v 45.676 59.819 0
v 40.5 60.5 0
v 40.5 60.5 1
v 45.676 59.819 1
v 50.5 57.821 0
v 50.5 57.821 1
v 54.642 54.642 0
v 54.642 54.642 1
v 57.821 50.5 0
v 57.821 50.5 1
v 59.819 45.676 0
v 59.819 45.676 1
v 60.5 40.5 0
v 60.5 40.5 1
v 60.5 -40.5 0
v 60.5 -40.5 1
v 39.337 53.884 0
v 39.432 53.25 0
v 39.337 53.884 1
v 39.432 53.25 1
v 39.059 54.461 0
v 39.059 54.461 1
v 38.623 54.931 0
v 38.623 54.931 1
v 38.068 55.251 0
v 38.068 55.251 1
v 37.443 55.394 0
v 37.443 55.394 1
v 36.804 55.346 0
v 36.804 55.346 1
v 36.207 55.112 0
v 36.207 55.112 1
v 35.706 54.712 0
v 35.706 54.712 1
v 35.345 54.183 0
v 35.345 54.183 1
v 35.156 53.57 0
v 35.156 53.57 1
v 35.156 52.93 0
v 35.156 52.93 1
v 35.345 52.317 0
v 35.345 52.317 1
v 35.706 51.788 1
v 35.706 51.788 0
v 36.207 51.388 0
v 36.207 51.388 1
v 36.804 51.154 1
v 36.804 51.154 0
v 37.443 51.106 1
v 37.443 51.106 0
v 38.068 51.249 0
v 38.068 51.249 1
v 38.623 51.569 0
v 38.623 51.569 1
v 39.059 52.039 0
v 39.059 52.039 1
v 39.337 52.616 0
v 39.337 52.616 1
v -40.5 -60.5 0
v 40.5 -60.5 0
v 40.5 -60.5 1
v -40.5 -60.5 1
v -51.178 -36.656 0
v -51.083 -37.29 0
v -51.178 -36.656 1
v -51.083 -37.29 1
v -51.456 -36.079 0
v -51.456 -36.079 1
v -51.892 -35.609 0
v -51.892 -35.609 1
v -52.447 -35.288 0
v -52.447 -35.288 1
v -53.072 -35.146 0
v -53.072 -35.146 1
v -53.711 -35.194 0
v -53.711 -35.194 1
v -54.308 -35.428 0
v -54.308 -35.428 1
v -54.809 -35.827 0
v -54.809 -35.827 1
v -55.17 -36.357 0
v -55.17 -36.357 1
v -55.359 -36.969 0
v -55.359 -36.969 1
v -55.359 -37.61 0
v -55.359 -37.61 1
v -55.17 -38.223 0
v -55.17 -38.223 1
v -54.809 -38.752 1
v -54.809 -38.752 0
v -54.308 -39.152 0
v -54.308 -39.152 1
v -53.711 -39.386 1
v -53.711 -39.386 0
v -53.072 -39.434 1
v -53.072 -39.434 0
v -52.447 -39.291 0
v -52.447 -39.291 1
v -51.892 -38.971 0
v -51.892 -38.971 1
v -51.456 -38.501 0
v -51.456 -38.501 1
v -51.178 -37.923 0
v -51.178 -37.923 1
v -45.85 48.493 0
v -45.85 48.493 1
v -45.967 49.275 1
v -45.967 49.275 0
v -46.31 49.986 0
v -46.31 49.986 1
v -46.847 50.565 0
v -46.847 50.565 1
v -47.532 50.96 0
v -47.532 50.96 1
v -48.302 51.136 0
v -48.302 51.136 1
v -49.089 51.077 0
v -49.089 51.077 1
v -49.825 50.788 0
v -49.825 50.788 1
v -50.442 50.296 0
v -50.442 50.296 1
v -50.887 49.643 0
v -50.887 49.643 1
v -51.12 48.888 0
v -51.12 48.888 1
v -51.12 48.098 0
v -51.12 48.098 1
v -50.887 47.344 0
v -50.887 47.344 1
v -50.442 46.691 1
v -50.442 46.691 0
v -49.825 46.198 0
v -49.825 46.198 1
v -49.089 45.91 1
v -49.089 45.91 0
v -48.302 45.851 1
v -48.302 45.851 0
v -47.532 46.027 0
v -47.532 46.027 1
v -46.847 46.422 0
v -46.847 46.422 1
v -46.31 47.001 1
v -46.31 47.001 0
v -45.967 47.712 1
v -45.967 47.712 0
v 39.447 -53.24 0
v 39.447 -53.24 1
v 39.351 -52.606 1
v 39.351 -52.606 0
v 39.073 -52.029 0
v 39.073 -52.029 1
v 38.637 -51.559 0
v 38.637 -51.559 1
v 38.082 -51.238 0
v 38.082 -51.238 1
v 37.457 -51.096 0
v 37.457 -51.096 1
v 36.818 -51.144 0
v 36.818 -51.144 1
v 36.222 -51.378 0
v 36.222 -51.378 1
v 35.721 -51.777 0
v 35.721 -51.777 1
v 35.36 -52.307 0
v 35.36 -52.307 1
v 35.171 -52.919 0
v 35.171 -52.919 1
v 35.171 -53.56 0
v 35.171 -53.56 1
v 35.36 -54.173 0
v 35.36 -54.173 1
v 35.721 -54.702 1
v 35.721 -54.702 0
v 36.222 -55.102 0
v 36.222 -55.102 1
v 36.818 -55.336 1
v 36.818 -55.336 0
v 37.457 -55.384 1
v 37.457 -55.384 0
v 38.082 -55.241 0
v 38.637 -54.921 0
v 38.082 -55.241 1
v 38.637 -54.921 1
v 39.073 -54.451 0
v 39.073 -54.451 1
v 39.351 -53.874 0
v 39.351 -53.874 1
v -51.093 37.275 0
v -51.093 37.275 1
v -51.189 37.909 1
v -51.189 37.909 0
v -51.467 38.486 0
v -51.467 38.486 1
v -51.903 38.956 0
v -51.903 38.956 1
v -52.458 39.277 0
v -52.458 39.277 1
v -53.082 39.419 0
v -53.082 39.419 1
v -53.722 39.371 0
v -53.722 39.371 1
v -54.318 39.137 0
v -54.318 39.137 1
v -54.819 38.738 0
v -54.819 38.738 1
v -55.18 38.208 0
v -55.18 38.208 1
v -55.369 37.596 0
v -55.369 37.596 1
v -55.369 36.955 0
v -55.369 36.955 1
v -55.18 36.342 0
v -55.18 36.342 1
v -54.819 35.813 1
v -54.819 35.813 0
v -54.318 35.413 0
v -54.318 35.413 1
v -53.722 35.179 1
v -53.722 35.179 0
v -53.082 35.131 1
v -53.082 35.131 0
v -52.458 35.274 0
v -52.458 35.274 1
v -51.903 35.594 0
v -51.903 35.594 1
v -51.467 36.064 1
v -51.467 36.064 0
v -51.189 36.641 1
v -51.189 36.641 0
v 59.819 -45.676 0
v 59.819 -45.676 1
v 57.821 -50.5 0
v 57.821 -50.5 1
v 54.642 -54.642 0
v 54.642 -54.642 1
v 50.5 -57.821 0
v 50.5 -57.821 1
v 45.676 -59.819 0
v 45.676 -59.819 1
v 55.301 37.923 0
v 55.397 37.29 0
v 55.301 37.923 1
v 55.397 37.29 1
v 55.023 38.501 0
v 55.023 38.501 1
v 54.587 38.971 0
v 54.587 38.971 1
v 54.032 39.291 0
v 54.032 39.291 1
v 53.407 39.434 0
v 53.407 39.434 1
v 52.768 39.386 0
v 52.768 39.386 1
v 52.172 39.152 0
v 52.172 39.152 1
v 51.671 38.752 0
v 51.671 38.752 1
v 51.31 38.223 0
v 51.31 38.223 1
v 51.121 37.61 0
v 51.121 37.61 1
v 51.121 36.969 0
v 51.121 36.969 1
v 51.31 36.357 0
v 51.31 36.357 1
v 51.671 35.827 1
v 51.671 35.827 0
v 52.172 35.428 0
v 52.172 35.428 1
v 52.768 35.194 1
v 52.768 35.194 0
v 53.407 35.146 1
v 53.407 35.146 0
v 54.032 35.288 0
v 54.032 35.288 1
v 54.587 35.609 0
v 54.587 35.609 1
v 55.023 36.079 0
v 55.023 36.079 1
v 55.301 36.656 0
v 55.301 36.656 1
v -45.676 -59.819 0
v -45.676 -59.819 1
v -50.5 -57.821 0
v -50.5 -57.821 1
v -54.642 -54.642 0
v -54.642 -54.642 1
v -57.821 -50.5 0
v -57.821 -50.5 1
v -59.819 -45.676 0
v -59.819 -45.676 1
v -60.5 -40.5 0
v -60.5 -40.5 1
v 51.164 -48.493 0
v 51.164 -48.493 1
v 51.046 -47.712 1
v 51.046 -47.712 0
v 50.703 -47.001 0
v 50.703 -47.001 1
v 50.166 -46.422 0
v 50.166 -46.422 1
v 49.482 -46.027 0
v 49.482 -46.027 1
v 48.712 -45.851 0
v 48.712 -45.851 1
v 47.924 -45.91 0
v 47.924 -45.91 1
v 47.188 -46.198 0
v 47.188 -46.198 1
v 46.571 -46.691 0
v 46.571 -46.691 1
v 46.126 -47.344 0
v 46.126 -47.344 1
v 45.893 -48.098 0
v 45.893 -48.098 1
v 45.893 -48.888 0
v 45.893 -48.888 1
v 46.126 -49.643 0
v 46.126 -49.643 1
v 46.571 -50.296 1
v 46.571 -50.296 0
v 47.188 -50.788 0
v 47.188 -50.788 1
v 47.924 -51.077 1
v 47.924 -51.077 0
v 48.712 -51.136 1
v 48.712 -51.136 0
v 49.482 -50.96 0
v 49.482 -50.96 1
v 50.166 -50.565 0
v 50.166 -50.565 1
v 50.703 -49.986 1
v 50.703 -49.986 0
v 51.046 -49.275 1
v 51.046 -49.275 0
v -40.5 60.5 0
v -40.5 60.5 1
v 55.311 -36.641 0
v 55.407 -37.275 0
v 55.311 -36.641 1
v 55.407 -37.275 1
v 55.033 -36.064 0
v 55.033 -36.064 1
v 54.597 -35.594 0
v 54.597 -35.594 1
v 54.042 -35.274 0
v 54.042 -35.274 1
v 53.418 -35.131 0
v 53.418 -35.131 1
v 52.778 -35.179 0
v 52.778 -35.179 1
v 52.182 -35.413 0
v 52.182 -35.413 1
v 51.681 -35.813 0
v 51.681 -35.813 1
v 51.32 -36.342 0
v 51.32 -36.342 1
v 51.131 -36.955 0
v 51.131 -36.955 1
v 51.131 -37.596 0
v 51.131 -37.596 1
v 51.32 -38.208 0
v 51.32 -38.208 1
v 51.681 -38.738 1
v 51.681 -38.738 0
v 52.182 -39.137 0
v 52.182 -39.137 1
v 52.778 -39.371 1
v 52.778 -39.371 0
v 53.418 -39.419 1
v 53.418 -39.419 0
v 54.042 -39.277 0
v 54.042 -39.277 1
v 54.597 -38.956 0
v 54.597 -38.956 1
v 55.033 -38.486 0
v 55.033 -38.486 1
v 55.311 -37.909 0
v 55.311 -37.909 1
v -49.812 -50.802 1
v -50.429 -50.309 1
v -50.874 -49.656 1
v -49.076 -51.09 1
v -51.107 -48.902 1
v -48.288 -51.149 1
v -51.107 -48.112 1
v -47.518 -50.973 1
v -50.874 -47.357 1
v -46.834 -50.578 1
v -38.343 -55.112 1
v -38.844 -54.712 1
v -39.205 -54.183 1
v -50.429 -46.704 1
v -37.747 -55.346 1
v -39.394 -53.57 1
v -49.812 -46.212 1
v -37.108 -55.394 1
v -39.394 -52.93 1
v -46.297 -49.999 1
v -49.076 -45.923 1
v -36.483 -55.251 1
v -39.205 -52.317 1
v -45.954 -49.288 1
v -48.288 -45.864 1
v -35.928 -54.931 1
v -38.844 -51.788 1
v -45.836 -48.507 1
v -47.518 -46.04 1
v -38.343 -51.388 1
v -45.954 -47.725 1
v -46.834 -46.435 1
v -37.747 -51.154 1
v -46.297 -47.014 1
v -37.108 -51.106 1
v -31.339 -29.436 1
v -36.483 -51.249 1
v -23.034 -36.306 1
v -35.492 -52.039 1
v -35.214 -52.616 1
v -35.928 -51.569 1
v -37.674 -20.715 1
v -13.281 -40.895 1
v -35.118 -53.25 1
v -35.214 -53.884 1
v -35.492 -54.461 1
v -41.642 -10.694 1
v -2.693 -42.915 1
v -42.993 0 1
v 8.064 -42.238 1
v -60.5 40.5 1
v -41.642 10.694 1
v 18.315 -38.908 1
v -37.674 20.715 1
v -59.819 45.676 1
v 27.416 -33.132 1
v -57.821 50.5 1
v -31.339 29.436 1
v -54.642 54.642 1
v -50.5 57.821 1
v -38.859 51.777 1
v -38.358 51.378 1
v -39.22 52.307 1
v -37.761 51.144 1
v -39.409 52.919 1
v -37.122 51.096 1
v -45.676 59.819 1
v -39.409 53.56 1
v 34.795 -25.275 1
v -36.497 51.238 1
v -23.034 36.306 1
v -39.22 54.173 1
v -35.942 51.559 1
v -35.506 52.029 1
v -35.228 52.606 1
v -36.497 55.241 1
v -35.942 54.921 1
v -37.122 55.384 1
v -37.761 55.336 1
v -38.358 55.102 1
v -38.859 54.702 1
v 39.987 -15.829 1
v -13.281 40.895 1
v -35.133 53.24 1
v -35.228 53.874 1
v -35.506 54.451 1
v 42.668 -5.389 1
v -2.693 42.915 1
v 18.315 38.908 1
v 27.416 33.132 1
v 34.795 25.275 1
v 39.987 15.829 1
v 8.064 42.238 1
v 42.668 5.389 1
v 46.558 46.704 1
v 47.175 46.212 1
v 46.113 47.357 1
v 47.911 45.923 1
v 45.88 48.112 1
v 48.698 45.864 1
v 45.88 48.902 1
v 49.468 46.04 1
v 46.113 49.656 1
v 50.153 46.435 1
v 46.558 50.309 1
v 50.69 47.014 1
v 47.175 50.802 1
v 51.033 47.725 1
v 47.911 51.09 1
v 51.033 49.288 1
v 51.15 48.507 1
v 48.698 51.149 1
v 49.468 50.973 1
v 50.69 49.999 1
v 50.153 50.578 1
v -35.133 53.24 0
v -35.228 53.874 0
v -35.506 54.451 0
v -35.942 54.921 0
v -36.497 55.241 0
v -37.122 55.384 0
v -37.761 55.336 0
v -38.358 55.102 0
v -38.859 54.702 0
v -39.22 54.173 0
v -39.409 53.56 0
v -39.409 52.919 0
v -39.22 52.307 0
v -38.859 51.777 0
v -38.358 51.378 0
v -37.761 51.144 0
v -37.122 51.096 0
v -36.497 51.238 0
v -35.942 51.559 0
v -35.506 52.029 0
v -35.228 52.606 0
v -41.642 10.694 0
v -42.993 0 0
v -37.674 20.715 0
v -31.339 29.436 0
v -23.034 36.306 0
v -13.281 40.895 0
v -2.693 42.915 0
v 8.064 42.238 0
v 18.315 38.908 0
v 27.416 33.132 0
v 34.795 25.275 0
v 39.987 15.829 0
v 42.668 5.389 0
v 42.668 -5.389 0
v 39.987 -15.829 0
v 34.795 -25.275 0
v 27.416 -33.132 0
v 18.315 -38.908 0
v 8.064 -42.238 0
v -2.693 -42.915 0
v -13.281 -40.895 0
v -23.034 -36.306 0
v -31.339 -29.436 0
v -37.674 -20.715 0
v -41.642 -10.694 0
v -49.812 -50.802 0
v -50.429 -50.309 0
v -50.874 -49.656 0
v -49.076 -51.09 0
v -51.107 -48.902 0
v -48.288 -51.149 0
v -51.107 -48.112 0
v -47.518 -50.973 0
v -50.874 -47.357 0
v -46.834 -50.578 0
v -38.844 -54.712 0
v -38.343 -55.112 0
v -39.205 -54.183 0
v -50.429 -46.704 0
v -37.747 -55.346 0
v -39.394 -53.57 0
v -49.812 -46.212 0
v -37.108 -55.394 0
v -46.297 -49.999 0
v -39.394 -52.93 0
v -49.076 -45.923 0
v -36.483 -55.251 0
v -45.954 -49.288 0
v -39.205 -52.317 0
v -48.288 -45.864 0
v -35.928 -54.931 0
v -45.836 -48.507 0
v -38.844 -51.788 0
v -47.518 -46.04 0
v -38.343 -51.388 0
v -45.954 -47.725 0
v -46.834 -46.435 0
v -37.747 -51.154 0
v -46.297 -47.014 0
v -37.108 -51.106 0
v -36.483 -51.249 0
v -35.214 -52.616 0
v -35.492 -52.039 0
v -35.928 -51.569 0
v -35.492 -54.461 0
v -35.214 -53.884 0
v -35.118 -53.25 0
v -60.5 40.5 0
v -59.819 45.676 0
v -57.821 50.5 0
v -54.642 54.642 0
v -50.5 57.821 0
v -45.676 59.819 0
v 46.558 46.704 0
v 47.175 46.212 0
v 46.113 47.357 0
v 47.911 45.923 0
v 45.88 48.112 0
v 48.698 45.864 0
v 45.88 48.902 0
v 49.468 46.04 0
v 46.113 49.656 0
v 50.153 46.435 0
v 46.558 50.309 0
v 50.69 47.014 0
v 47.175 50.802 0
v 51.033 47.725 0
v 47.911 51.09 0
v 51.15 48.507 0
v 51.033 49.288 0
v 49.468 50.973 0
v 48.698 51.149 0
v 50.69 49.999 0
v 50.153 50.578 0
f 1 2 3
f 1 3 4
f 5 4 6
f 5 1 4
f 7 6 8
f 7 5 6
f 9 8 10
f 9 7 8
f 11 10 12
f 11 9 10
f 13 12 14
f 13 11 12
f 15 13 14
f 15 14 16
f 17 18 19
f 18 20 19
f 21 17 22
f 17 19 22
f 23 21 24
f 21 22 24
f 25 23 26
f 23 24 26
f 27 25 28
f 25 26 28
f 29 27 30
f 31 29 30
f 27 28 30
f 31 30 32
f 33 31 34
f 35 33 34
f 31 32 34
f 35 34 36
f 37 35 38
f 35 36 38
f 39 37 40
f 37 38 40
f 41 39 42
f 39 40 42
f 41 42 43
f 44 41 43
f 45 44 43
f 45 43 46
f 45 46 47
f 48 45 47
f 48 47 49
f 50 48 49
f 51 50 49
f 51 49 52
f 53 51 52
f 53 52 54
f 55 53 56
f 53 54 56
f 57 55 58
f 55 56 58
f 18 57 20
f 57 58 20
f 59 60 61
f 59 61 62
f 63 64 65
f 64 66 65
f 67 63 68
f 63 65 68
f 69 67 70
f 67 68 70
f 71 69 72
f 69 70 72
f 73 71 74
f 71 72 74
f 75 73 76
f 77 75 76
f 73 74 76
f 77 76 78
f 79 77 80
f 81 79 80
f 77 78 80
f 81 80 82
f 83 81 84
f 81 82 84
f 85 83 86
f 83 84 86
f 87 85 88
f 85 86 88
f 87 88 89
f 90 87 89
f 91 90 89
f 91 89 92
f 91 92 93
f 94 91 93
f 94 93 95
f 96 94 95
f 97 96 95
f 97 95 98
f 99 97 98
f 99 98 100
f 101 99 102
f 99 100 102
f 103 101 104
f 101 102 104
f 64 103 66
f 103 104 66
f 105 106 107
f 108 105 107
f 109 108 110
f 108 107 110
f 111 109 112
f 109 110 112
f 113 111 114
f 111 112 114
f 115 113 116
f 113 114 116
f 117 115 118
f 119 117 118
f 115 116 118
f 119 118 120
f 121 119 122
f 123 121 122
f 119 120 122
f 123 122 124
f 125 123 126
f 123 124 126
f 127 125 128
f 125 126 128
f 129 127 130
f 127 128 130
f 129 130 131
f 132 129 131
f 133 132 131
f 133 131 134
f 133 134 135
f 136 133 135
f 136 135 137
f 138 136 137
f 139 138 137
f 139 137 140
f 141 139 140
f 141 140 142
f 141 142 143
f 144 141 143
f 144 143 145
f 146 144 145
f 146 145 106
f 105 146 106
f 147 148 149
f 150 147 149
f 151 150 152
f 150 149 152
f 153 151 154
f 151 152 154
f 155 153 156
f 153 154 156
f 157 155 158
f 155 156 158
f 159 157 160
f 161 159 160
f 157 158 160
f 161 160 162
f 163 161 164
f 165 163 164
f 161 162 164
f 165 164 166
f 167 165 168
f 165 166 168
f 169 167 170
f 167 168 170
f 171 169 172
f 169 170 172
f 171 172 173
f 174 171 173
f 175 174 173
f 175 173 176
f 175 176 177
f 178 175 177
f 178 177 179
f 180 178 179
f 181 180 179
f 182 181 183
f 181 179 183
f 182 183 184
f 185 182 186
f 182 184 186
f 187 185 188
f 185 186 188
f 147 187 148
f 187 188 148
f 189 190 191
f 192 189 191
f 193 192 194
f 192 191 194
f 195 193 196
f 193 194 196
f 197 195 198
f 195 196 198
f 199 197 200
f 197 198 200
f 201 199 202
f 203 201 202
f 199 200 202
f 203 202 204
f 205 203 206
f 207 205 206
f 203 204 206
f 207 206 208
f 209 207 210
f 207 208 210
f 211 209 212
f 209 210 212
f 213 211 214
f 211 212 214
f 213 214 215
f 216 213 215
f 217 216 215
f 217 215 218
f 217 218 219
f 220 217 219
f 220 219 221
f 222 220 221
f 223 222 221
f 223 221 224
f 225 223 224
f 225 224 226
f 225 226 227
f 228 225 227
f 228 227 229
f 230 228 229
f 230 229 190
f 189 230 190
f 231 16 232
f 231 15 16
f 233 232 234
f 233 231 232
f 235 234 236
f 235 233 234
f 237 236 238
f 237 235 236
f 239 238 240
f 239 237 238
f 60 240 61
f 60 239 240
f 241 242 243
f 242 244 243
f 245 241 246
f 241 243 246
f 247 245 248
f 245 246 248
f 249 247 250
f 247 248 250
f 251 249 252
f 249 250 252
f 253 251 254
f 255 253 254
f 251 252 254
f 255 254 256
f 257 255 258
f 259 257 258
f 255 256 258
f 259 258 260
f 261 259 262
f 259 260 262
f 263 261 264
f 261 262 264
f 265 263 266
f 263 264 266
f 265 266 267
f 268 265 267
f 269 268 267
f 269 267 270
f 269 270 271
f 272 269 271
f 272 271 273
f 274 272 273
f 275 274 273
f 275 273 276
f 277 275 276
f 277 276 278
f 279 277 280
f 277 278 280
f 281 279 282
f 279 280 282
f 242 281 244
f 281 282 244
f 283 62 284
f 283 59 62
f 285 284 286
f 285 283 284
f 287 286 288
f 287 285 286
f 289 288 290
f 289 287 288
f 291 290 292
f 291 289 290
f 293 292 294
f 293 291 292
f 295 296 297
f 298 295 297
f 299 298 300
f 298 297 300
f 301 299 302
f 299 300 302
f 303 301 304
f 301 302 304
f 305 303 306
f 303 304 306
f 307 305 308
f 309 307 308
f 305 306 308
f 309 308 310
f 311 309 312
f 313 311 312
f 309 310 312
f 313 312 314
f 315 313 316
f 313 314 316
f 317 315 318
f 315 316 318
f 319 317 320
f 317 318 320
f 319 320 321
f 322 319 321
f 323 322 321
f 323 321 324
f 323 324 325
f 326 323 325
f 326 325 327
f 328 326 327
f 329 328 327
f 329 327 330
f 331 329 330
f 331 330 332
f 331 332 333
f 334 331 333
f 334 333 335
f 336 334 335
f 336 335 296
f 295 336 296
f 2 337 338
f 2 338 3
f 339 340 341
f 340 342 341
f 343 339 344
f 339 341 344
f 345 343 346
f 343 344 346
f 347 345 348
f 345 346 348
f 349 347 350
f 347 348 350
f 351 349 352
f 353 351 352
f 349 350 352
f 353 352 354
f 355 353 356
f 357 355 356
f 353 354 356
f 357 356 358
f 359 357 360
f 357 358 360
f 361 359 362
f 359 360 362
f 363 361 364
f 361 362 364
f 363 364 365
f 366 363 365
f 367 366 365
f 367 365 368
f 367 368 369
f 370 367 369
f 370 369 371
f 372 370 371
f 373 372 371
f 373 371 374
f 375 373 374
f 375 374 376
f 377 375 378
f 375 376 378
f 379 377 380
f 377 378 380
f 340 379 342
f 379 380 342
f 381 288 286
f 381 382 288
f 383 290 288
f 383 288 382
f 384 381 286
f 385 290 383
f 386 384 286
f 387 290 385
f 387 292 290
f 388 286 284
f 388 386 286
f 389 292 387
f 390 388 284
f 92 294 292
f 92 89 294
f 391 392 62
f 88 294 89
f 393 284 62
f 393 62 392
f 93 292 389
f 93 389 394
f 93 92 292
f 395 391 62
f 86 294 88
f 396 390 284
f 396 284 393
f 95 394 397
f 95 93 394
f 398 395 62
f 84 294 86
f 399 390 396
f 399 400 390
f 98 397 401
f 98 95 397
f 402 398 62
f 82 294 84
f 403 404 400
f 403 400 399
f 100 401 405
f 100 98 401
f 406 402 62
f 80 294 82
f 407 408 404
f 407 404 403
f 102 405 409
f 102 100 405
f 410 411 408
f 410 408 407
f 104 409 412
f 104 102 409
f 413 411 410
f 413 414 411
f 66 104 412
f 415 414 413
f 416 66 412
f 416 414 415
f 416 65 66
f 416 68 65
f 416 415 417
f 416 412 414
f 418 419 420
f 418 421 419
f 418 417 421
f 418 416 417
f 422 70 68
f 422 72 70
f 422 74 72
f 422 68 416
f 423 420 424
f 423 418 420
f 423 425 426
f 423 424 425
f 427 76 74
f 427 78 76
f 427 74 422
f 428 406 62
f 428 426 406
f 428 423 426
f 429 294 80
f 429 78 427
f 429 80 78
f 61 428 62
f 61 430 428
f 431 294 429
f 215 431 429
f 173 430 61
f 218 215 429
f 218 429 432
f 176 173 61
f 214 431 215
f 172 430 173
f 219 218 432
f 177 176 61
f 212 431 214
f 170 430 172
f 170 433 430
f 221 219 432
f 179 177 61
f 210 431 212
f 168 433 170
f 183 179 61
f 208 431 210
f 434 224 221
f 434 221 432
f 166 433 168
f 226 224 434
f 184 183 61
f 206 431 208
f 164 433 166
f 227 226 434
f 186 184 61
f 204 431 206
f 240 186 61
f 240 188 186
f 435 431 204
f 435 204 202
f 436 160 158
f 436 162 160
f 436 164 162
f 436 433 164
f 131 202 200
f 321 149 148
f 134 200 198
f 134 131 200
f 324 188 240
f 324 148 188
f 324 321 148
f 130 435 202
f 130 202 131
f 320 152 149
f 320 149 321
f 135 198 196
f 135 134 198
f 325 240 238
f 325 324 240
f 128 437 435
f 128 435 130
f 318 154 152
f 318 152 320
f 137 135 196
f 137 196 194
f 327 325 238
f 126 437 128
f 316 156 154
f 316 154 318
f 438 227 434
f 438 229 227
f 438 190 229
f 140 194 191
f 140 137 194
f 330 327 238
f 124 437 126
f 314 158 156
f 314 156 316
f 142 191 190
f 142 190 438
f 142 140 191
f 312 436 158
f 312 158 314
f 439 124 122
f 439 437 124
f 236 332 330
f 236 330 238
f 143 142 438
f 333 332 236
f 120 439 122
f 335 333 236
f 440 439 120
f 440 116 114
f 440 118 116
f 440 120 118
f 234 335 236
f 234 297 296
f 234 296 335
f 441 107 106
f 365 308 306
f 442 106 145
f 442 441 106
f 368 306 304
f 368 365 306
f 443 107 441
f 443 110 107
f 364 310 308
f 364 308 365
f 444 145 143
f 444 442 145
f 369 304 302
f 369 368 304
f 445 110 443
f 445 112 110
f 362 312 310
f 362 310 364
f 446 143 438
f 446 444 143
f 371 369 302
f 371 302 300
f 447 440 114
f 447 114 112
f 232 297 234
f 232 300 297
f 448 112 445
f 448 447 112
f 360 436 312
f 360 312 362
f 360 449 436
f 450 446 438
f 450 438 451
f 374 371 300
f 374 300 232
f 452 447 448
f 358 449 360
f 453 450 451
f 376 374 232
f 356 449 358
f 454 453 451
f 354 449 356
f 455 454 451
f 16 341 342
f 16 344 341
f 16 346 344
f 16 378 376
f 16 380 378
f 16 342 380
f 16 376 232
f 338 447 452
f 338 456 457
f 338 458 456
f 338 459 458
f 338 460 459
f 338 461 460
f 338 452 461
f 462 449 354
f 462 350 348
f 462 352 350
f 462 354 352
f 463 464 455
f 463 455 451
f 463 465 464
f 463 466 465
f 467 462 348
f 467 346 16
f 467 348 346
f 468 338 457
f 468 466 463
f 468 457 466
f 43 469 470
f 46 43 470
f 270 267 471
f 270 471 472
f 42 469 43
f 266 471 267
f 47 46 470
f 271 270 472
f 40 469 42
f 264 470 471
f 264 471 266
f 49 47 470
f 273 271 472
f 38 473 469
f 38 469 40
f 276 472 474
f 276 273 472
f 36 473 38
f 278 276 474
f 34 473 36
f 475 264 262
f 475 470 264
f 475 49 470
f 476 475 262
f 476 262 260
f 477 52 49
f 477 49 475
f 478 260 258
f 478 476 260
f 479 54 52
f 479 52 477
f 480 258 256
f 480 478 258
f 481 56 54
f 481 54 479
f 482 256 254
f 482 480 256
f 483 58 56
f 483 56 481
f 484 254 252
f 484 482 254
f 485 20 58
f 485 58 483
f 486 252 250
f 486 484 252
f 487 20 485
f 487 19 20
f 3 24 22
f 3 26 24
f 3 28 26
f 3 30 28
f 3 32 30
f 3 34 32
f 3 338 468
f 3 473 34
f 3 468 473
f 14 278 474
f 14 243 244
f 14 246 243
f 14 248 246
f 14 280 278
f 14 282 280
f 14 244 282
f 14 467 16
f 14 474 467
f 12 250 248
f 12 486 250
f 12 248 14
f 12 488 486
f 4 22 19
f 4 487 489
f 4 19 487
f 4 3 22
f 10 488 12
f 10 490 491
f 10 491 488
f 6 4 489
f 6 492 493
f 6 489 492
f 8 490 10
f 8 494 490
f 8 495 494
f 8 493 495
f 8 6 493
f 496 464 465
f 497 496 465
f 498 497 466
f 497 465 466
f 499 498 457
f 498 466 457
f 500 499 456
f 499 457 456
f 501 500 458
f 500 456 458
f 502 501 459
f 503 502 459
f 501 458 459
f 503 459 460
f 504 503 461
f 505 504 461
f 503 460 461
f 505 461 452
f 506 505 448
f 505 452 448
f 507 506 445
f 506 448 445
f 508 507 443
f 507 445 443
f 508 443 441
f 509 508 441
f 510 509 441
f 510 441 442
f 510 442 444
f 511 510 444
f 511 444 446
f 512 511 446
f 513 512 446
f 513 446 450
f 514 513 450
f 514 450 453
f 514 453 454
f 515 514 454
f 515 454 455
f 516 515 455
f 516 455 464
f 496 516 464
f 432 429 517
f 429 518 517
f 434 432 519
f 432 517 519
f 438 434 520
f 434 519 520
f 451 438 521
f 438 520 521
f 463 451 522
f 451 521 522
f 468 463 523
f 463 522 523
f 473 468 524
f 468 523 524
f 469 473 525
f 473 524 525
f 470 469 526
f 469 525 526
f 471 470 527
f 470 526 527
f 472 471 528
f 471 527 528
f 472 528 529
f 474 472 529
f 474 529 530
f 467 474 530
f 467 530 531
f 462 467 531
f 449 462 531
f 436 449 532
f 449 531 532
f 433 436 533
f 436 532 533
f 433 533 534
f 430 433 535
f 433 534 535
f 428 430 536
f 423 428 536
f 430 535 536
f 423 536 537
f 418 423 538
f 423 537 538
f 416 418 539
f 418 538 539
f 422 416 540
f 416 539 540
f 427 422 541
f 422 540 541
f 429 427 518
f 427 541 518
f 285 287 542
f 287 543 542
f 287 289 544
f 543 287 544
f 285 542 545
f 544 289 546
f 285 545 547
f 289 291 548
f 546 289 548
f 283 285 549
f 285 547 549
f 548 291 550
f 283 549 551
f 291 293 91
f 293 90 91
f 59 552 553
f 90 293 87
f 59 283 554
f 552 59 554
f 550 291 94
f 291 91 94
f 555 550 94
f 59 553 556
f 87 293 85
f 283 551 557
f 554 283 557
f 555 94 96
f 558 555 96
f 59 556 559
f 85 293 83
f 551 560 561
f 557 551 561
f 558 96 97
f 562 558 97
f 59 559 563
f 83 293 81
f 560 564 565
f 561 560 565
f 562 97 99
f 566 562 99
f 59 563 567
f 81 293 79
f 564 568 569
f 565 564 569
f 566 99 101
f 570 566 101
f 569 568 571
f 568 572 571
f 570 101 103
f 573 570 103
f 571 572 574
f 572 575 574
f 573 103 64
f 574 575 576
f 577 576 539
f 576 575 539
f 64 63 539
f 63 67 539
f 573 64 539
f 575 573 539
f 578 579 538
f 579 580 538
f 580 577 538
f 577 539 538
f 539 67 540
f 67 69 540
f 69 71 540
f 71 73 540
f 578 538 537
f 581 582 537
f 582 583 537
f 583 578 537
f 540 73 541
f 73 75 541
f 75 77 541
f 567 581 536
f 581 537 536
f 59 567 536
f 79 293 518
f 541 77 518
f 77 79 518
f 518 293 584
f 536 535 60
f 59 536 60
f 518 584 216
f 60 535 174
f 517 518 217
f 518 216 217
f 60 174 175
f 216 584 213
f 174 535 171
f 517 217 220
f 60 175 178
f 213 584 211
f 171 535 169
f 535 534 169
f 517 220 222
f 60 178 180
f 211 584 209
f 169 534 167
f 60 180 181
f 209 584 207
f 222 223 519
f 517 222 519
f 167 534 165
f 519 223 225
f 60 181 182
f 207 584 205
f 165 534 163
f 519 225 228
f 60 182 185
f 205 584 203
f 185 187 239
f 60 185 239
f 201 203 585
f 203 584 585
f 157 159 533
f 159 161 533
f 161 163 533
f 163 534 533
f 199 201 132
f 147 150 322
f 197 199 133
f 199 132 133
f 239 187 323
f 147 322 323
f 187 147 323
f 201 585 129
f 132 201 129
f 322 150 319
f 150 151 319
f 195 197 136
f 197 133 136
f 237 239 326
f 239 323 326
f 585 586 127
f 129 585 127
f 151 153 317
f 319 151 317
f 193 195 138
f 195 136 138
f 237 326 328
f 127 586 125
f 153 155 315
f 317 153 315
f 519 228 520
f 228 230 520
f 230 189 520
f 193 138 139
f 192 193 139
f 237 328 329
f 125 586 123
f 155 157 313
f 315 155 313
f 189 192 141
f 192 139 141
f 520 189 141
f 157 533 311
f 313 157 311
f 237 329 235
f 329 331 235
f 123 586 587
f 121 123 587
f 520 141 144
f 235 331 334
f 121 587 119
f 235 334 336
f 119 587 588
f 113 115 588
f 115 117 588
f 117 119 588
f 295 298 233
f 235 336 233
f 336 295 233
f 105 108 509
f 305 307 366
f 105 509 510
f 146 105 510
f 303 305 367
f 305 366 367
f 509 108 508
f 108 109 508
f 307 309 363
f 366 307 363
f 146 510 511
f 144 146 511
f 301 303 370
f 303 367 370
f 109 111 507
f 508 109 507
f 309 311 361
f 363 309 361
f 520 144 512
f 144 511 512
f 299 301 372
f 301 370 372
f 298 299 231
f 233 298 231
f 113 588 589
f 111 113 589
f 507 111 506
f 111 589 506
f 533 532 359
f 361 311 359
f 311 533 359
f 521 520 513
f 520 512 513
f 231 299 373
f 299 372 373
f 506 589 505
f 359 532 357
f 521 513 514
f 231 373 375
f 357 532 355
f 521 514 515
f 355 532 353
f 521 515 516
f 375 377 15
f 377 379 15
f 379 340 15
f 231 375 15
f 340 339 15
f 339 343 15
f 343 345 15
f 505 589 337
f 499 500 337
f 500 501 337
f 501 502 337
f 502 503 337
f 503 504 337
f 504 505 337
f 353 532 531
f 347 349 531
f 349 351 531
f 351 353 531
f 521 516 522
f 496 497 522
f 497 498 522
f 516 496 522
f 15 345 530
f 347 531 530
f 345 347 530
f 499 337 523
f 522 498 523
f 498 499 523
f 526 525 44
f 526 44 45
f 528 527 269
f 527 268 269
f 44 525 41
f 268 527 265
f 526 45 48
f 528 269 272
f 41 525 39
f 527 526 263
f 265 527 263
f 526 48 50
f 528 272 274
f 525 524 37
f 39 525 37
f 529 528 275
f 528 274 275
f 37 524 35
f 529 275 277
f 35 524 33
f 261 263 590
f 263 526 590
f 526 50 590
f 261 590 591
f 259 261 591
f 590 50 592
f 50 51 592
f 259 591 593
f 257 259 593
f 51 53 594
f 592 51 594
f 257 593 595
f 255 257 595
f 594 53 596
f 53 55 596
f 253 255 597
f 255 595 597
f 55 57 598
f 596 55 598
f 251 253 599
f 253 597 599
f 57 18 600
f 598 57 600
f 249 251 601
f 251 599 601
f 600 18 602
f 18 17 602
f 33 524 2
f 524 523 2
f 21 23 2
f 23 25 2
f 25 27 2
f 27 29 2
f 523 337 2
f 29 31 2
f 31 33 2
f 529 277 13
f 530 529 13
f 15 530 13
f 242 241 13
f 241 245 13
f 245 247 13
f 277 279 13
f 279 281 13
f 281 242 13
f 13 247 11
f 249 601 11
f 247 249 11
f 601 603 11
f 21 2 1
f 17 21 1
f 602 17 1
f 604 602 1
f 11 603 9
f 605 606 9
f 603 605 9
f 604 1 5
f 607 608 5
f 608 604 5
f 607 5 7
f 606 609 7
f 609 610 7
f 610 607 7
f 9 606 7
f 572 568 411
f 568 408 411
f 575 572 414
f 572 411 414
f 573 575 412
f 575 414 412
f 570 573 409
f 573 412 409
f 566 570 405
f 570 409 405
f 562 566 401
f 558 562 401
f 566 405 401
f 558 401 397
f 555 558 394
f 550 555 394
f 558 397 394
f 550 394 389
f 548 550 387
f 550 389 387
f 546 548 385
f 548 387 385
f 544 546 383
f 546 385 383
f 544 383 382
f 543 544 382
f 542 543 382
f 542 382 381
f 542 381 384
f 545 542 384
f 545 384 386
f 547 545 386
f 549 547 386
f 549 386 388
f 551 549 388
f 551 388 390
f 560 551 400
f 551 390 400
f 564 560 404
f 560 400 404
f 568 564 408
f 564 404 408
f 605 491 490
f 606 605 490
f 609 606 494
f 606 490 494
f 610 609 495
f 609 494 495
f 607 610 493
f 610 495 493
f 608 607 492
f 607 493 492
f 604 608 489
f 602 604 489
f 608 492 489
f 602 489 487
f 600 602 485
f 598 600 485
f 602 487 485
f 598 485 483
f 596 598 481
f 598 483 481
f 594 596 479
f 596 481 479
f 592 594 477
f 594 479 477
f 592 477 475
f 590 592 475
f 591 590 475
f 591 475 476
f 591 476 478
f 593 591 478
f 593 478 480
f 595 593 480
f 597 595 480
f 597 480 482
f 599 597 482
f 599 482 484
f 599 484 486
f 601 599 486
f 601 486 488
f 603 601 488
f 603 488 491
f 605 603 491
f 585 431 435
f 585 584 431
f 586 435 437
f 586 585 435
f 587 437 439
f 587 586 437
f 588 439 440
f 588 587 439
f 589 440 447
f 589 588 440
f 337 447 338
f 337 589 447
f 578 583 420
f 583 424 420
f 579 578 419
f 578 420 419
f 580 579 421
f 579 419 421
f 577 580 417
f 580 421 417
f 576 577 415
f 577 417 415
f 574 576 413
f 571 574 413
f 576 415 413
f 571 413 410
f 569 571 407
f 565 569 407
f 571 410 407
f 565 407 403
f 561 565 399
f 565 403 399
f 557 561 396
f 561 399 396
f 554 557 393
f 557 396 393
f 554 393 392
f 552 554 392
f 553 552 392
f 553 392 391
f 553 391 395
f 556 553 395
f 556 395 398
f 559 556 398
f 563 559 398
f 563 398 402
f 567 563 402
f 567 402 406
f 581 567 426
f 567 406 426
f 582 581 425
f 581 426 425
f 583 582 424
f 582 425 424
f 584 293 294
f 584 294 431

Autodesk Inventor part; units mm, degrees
ref_plane "YZ Plane" through (0, 0, 0) normal (1, 0, 0) x (0, 1, 0)
ref_plane "XZ Plane" through (0, 0, 0) normal (0, 1, 0) x (-1, 0, 0)
ref_plane "XY Plane" through (0, 0, 0) normal (0, 0, 1) x (1, 0, 0)
sketch "Sketch1" plane through (0, 0, 0) normal (0, 0, 1) x (1, 0, 0)
  circle A0 centre (0, 0) radius 29
  circle A1 centre (0, 0) radius 60.5
  line L0 (-40.5, 60.5) -> (40.5, 60.5)
  line L1 (60.5, 40.5) -> (60.5, -40.5)
  line L2 (40.5, -60.5) -> (-40.5, -60.5)
  line L3 (-60.5, -40.5) -> (-60.5, 40.5)
  arc A2 (-40.5, 60.5) -> (-60.5, 40.5) centre (-40.5, 40.5) ccw
  arc A3 (60.5, 40.5) -> (40.5, 60.5) centre (40.5, 40.5) ccw
  arc A4 (40.5, -60.5) -> (60.5, -40.5) centre (40.5, -40.5) ccw
  arc A5 (-60.5, -40.5) -> (-40.5, -60.5) centre (-40.5, -40.5) ccw
  dimension "d0" = 58
  dimension "d1" = 121
  dimension "d2" = 20
extrude "Extrusion1" add sketch "Sketch1" along normal blind 1
sketch "Sketch2" plane through (0, 0, 1) normal (0, 0, 1) x (1, 0, 0)
  circle A0 centre (-48.4865, -48.5066) radius 2.65 projected
  circle A1 centre (-37.2683, -53.25) radius 2.15 projected
  circle A2 centre (-53.2329, -37.2897) radius 2.15 projected
  circle A3 centre (-53.2431, 37.2752) radius 2.15 projected
  circle A4 centre (-48.4997, 48.4934) radius 2.65 projected
  circle A5 centre (-37.2829, 53.2398) radius 2.15 projected
  circle A6 centre (37.2821, 53.25) radius 2.15 projected
  circle A7 centre (48.5003, 48.5066) radius 2.65 projected
  circle A8 centre (53.2467, 37.2897) radius 2.15 projected
  circle A9 centre (53.2569, -37.2752) radius 2.15 projected
  circle A10 centre (48.5135, -48.4934) radius 2.65 projected
  circle A11 centre (37.2966, -53.2398) radius 2.15 projected
  point P0 (0, 0)
extrude "Extrusion2" cut sketch "Sketch2" against normal through all
sketch "Sketch3" plane through (0, 0, 0) normal (0, 0, -1) x (-1, 0, 0)
  circle A0 centre (-0.0069, 0) radius 43 projected
  point P0 (0, 0)
extrude "Extrusion3" cut sketch "Sketch3" against normal through all
properties part number "stator_mount_02_left_p" material "PC/ABS Plastic"
